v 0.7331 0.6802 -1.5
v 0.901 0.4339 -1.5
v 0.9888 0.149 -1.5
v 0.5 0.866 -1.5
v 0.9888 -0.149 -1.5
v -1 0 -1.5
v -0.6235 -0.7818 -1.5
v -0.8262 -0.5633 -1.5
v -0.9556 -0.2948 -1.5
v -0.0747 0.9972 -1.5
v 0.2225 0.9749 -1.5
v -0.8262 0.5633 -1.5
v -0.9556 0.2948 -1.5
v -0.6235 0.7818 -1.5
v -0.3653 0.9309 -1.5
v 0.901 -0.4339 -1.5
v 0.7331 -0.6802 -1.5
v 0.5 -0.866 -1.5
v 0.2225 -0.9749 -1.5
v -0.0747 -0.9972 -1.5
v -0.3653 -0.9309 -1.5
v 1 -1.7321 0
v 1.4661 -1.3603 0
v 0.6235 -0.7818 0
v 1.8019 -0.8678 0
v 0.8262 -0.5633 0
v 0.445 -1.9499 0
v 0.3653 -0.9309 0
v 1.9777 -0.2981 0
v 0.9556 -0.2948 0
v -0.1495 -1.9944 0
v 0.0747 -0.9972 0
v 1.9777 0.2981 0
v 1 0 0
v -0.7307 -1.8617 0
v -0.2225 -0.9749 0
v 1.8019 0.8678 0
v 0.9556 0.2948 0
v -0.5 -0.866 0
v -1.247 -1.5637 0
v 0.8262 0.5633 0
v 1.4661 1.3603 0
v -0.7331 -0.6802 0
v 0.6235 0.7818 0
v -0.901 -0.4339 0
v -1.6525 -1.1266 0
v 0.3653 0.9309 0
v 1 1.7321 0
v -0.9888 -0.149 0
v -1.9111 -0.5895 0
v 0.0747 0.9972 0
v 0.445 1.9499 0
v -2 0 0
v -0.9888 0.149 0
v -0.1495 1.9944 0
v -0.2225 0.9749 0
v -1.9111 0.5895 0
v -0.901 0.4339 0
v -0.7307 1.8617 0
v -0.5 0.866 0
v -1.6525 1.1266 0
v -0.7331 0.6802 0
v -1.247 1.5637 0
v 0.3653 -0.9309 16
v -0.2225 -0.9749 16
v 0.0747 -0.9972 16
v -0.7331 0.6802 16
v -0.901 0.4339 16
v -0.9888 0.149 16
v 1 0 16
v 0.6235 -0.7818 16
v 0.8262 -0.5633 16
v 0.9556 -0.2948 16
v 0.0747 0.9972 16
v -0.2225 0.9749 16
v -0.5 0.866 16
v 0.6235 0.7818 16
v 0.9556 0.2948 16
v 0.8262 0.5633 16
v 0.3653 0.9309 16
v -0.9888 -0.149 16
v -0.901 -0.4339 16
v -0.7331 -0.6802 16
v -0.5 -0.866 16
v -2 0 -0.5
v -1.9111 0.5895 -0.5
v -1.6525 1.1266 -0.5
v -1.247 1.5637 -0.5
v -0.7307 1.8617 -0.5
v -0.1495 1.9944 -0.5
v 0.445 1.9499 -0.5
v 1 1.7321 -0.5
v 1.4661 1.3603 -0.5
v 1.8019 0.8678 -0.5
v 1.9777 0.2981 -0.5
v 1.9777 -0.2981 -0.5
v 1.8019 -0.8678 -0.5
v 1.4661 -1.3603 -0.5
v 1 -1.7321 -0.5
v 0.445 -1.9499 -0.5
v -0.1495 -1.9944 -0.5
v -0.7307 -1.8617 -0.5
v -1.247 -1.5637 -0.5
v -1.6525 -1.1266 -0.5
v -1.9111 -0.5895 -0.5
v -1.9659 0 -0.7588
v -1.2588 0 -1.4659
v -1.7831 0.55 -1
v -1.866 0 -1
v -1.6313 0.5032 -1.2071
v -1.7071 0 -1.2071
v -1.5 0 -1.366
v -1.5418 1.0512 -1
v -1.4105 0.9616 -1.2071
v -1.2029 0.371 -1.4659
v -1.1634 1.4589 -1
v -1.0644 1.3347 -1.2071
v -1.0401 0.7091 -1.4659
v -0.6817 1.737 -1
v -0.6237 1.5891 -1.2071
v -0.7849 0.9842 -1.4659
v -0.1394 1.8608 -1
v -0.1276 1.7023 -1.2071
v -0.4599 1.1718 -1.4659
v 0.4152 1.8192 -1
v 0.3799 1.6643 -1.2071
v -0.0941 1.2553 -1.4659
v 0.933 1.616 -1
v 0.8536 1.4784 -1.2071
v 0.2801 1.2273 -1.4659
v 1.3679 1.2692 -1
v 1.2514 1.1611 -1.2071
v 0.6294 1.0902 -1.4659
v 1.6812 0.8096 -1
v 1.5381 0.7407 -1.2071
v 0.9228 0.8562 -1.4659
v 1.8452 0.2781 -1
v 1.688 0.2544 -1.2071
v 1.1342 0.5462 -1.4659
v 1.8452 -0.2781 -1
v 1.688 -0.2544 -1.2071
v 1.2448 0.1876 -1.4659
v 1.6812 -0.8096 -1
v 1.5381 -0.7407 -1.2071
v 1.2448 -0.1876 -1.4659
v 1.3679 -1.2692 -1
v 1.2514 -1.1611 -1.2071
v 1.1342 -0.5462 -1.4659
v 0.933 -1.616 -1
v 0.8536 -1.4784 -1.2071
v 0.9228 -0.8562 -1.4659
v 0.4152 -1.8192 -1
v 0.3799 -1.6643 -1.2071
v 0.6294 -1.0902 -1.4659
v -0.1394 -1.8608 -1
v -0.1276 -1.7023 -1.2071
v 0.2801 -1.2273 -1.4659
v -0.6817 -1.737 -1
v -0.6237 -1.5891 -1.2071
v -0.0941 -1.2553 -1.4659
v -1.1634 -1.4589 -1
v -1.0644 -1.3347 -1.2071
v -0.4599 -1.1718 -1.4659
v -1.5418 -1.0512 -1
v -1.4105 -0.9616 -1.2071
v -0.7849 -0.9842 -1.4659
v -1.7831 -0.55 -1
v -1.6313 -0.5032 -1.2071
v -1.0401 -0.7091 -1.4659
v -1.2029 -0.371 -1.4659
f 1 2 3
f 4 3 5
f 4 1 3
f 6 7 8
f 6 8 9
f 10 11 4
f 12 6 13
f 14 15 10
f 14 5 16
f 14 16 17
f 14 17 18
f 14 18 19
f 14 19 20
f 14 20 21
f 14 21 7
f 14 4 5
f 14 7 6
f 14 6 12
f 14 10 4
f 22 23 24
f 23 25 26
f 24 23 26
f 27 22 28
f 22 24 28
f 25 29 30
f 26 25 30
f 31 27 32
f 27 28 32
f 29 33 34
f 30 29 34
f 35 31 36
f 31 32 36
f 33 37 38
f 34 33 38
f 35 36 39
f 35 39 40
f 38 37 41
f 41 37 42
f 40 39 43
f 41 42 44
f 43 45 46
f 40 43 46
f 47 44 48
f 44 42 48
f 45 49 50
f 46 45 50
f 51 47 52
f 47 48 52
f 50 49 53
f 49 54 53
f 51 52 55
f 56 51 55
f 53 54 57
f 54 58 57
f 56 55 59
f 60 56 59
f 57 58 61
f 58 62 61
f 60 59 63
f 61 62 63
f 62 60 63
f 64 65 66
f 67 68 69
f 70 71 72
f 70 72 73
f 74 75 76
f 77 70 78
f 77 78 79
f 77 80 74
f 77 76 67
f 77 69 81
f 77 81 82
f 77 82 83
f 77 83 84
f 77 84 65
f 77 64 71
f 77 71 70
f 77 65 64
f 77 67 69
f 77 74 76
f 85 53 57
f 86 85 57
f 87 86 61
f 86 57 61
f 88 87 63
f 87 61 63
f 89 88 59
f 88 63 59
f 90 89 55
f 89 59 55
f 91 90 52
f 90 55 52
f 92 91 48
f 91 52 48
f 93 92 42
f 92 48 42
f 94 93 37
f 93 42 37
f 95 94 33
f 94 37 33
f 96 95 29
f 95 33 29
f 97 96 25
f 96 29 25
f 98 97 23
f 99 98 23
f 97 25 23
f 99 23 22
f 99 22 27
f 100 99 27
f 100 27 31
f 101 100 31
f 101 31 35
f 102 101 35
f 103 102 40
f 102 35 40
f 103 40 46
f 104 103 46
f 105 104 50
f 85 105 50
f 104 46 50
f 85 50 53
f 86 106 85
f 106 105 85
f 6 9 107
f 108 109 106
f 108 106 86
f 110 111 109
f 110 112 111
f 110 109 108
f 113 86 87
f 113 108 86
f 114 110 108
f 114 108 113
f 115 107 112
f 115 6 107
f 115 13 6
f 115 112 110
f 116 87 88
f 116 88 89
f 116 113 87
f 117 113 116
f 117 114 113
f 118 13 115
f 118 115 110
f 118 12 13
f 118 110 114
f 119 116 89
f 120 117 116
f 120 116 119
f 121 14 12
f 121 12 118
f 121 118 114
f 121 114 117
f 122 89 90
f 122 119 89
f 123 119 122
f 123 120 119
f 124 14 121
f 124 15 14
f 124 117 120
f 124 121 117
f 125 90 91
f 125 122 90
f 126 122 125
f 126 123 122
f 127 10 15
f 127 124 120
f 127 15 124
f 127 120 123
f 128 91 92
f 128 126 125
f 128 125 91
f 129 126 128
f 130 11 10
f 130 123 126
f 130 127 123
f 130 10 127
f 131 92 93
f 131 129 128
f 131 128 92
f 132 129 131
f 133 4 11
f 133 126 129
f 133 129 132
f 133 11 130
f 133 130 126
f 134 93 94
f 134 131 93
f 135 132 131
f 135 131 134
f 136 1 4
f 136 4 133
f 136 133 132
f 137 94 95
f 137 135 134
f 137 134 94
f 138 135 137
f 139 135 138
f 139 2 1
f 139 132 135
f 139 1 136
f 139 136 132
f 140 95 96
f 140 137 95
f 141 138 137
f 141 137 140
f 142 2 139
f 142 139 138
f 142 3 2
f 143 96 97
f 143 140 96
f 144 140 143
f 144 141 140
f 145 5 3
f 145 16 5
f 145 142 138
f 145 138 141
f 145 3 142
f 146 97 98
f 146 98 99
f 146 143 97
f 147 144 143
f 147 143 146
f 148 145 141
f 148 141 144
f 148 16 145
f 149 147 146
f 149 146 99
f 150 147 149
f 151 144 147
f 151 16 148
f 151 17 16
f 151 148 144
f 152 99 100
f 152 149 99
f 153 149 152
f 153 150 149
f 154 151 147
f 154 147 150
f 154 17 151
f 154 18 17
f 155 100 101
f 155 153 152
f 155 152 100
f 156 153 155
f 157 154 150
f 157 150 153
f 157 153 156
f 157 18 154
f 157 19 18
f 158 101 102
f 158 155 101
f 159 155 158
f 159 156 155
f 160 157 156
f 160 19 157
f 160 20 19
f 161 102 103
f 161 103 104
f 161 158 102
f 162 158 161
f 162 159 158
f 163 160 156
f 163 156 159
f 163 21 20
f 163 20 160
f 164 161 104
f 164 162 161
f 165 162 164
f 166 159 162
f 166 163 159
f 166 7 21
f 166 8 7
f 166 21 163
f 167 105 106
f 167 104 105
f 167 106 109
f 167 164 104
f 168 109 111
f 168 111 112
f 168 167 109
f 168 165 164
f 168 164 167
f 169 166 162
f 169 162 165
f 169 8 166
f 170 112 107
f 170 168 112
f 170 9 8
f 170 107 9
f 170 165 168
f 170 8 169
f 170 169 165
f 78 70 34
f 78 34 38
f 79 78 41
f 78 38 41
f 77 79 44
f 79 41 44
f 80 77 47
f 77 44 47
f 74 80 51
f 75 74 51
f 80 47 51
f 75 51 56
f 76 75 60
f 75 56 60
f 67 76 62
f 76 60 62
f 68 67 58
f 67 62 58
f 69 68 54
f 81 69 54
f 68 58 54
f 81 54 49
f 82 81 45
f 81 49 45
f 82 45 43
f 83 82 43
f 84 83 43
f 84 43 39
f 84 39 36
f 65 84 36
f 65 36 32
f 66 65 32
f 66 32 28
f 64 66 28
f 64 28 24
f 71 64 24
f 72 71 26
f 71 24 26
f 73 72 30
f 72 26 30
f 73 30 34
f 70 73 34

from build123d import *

# Parameters (mm, degrees)
SKETCH1_R           = 1
BOSS_EXTRUDE1_DEPTH = 16
SKETCH2_R           = 2
BOSS_EXTRUDE2_DEPTH = 1.5
FILLET1_R           = 1


with BuildPart() as part:
    # Sketch1 → Boss-Extrude1 (new body)
    with BuildSketch(Plane.XY):
        Circle(SKETCH1_R)
    extrude(amount=BOSS_EXTRUDE1_DEPTH)

    # Sketch2 → Boss-Extrude2 (add)
    with BuildSketch(Plane(origin=(0, 0, 0), x_dir=(-1, 0, 0), z_dir=(0, 0, -1))):
        Circle(SKETCH2_R)
    extrude(amount=BOSS_EXTRUDE2_DEPTH)

    # Fillet1
    fillet1_edges = [part.edges().sort_by_distance(p)[0] for p in [
        (2, 0, -1.5),
    ]]
    fillet(fillet1_edges, radius=FILLET1_R)


solid = part.part
